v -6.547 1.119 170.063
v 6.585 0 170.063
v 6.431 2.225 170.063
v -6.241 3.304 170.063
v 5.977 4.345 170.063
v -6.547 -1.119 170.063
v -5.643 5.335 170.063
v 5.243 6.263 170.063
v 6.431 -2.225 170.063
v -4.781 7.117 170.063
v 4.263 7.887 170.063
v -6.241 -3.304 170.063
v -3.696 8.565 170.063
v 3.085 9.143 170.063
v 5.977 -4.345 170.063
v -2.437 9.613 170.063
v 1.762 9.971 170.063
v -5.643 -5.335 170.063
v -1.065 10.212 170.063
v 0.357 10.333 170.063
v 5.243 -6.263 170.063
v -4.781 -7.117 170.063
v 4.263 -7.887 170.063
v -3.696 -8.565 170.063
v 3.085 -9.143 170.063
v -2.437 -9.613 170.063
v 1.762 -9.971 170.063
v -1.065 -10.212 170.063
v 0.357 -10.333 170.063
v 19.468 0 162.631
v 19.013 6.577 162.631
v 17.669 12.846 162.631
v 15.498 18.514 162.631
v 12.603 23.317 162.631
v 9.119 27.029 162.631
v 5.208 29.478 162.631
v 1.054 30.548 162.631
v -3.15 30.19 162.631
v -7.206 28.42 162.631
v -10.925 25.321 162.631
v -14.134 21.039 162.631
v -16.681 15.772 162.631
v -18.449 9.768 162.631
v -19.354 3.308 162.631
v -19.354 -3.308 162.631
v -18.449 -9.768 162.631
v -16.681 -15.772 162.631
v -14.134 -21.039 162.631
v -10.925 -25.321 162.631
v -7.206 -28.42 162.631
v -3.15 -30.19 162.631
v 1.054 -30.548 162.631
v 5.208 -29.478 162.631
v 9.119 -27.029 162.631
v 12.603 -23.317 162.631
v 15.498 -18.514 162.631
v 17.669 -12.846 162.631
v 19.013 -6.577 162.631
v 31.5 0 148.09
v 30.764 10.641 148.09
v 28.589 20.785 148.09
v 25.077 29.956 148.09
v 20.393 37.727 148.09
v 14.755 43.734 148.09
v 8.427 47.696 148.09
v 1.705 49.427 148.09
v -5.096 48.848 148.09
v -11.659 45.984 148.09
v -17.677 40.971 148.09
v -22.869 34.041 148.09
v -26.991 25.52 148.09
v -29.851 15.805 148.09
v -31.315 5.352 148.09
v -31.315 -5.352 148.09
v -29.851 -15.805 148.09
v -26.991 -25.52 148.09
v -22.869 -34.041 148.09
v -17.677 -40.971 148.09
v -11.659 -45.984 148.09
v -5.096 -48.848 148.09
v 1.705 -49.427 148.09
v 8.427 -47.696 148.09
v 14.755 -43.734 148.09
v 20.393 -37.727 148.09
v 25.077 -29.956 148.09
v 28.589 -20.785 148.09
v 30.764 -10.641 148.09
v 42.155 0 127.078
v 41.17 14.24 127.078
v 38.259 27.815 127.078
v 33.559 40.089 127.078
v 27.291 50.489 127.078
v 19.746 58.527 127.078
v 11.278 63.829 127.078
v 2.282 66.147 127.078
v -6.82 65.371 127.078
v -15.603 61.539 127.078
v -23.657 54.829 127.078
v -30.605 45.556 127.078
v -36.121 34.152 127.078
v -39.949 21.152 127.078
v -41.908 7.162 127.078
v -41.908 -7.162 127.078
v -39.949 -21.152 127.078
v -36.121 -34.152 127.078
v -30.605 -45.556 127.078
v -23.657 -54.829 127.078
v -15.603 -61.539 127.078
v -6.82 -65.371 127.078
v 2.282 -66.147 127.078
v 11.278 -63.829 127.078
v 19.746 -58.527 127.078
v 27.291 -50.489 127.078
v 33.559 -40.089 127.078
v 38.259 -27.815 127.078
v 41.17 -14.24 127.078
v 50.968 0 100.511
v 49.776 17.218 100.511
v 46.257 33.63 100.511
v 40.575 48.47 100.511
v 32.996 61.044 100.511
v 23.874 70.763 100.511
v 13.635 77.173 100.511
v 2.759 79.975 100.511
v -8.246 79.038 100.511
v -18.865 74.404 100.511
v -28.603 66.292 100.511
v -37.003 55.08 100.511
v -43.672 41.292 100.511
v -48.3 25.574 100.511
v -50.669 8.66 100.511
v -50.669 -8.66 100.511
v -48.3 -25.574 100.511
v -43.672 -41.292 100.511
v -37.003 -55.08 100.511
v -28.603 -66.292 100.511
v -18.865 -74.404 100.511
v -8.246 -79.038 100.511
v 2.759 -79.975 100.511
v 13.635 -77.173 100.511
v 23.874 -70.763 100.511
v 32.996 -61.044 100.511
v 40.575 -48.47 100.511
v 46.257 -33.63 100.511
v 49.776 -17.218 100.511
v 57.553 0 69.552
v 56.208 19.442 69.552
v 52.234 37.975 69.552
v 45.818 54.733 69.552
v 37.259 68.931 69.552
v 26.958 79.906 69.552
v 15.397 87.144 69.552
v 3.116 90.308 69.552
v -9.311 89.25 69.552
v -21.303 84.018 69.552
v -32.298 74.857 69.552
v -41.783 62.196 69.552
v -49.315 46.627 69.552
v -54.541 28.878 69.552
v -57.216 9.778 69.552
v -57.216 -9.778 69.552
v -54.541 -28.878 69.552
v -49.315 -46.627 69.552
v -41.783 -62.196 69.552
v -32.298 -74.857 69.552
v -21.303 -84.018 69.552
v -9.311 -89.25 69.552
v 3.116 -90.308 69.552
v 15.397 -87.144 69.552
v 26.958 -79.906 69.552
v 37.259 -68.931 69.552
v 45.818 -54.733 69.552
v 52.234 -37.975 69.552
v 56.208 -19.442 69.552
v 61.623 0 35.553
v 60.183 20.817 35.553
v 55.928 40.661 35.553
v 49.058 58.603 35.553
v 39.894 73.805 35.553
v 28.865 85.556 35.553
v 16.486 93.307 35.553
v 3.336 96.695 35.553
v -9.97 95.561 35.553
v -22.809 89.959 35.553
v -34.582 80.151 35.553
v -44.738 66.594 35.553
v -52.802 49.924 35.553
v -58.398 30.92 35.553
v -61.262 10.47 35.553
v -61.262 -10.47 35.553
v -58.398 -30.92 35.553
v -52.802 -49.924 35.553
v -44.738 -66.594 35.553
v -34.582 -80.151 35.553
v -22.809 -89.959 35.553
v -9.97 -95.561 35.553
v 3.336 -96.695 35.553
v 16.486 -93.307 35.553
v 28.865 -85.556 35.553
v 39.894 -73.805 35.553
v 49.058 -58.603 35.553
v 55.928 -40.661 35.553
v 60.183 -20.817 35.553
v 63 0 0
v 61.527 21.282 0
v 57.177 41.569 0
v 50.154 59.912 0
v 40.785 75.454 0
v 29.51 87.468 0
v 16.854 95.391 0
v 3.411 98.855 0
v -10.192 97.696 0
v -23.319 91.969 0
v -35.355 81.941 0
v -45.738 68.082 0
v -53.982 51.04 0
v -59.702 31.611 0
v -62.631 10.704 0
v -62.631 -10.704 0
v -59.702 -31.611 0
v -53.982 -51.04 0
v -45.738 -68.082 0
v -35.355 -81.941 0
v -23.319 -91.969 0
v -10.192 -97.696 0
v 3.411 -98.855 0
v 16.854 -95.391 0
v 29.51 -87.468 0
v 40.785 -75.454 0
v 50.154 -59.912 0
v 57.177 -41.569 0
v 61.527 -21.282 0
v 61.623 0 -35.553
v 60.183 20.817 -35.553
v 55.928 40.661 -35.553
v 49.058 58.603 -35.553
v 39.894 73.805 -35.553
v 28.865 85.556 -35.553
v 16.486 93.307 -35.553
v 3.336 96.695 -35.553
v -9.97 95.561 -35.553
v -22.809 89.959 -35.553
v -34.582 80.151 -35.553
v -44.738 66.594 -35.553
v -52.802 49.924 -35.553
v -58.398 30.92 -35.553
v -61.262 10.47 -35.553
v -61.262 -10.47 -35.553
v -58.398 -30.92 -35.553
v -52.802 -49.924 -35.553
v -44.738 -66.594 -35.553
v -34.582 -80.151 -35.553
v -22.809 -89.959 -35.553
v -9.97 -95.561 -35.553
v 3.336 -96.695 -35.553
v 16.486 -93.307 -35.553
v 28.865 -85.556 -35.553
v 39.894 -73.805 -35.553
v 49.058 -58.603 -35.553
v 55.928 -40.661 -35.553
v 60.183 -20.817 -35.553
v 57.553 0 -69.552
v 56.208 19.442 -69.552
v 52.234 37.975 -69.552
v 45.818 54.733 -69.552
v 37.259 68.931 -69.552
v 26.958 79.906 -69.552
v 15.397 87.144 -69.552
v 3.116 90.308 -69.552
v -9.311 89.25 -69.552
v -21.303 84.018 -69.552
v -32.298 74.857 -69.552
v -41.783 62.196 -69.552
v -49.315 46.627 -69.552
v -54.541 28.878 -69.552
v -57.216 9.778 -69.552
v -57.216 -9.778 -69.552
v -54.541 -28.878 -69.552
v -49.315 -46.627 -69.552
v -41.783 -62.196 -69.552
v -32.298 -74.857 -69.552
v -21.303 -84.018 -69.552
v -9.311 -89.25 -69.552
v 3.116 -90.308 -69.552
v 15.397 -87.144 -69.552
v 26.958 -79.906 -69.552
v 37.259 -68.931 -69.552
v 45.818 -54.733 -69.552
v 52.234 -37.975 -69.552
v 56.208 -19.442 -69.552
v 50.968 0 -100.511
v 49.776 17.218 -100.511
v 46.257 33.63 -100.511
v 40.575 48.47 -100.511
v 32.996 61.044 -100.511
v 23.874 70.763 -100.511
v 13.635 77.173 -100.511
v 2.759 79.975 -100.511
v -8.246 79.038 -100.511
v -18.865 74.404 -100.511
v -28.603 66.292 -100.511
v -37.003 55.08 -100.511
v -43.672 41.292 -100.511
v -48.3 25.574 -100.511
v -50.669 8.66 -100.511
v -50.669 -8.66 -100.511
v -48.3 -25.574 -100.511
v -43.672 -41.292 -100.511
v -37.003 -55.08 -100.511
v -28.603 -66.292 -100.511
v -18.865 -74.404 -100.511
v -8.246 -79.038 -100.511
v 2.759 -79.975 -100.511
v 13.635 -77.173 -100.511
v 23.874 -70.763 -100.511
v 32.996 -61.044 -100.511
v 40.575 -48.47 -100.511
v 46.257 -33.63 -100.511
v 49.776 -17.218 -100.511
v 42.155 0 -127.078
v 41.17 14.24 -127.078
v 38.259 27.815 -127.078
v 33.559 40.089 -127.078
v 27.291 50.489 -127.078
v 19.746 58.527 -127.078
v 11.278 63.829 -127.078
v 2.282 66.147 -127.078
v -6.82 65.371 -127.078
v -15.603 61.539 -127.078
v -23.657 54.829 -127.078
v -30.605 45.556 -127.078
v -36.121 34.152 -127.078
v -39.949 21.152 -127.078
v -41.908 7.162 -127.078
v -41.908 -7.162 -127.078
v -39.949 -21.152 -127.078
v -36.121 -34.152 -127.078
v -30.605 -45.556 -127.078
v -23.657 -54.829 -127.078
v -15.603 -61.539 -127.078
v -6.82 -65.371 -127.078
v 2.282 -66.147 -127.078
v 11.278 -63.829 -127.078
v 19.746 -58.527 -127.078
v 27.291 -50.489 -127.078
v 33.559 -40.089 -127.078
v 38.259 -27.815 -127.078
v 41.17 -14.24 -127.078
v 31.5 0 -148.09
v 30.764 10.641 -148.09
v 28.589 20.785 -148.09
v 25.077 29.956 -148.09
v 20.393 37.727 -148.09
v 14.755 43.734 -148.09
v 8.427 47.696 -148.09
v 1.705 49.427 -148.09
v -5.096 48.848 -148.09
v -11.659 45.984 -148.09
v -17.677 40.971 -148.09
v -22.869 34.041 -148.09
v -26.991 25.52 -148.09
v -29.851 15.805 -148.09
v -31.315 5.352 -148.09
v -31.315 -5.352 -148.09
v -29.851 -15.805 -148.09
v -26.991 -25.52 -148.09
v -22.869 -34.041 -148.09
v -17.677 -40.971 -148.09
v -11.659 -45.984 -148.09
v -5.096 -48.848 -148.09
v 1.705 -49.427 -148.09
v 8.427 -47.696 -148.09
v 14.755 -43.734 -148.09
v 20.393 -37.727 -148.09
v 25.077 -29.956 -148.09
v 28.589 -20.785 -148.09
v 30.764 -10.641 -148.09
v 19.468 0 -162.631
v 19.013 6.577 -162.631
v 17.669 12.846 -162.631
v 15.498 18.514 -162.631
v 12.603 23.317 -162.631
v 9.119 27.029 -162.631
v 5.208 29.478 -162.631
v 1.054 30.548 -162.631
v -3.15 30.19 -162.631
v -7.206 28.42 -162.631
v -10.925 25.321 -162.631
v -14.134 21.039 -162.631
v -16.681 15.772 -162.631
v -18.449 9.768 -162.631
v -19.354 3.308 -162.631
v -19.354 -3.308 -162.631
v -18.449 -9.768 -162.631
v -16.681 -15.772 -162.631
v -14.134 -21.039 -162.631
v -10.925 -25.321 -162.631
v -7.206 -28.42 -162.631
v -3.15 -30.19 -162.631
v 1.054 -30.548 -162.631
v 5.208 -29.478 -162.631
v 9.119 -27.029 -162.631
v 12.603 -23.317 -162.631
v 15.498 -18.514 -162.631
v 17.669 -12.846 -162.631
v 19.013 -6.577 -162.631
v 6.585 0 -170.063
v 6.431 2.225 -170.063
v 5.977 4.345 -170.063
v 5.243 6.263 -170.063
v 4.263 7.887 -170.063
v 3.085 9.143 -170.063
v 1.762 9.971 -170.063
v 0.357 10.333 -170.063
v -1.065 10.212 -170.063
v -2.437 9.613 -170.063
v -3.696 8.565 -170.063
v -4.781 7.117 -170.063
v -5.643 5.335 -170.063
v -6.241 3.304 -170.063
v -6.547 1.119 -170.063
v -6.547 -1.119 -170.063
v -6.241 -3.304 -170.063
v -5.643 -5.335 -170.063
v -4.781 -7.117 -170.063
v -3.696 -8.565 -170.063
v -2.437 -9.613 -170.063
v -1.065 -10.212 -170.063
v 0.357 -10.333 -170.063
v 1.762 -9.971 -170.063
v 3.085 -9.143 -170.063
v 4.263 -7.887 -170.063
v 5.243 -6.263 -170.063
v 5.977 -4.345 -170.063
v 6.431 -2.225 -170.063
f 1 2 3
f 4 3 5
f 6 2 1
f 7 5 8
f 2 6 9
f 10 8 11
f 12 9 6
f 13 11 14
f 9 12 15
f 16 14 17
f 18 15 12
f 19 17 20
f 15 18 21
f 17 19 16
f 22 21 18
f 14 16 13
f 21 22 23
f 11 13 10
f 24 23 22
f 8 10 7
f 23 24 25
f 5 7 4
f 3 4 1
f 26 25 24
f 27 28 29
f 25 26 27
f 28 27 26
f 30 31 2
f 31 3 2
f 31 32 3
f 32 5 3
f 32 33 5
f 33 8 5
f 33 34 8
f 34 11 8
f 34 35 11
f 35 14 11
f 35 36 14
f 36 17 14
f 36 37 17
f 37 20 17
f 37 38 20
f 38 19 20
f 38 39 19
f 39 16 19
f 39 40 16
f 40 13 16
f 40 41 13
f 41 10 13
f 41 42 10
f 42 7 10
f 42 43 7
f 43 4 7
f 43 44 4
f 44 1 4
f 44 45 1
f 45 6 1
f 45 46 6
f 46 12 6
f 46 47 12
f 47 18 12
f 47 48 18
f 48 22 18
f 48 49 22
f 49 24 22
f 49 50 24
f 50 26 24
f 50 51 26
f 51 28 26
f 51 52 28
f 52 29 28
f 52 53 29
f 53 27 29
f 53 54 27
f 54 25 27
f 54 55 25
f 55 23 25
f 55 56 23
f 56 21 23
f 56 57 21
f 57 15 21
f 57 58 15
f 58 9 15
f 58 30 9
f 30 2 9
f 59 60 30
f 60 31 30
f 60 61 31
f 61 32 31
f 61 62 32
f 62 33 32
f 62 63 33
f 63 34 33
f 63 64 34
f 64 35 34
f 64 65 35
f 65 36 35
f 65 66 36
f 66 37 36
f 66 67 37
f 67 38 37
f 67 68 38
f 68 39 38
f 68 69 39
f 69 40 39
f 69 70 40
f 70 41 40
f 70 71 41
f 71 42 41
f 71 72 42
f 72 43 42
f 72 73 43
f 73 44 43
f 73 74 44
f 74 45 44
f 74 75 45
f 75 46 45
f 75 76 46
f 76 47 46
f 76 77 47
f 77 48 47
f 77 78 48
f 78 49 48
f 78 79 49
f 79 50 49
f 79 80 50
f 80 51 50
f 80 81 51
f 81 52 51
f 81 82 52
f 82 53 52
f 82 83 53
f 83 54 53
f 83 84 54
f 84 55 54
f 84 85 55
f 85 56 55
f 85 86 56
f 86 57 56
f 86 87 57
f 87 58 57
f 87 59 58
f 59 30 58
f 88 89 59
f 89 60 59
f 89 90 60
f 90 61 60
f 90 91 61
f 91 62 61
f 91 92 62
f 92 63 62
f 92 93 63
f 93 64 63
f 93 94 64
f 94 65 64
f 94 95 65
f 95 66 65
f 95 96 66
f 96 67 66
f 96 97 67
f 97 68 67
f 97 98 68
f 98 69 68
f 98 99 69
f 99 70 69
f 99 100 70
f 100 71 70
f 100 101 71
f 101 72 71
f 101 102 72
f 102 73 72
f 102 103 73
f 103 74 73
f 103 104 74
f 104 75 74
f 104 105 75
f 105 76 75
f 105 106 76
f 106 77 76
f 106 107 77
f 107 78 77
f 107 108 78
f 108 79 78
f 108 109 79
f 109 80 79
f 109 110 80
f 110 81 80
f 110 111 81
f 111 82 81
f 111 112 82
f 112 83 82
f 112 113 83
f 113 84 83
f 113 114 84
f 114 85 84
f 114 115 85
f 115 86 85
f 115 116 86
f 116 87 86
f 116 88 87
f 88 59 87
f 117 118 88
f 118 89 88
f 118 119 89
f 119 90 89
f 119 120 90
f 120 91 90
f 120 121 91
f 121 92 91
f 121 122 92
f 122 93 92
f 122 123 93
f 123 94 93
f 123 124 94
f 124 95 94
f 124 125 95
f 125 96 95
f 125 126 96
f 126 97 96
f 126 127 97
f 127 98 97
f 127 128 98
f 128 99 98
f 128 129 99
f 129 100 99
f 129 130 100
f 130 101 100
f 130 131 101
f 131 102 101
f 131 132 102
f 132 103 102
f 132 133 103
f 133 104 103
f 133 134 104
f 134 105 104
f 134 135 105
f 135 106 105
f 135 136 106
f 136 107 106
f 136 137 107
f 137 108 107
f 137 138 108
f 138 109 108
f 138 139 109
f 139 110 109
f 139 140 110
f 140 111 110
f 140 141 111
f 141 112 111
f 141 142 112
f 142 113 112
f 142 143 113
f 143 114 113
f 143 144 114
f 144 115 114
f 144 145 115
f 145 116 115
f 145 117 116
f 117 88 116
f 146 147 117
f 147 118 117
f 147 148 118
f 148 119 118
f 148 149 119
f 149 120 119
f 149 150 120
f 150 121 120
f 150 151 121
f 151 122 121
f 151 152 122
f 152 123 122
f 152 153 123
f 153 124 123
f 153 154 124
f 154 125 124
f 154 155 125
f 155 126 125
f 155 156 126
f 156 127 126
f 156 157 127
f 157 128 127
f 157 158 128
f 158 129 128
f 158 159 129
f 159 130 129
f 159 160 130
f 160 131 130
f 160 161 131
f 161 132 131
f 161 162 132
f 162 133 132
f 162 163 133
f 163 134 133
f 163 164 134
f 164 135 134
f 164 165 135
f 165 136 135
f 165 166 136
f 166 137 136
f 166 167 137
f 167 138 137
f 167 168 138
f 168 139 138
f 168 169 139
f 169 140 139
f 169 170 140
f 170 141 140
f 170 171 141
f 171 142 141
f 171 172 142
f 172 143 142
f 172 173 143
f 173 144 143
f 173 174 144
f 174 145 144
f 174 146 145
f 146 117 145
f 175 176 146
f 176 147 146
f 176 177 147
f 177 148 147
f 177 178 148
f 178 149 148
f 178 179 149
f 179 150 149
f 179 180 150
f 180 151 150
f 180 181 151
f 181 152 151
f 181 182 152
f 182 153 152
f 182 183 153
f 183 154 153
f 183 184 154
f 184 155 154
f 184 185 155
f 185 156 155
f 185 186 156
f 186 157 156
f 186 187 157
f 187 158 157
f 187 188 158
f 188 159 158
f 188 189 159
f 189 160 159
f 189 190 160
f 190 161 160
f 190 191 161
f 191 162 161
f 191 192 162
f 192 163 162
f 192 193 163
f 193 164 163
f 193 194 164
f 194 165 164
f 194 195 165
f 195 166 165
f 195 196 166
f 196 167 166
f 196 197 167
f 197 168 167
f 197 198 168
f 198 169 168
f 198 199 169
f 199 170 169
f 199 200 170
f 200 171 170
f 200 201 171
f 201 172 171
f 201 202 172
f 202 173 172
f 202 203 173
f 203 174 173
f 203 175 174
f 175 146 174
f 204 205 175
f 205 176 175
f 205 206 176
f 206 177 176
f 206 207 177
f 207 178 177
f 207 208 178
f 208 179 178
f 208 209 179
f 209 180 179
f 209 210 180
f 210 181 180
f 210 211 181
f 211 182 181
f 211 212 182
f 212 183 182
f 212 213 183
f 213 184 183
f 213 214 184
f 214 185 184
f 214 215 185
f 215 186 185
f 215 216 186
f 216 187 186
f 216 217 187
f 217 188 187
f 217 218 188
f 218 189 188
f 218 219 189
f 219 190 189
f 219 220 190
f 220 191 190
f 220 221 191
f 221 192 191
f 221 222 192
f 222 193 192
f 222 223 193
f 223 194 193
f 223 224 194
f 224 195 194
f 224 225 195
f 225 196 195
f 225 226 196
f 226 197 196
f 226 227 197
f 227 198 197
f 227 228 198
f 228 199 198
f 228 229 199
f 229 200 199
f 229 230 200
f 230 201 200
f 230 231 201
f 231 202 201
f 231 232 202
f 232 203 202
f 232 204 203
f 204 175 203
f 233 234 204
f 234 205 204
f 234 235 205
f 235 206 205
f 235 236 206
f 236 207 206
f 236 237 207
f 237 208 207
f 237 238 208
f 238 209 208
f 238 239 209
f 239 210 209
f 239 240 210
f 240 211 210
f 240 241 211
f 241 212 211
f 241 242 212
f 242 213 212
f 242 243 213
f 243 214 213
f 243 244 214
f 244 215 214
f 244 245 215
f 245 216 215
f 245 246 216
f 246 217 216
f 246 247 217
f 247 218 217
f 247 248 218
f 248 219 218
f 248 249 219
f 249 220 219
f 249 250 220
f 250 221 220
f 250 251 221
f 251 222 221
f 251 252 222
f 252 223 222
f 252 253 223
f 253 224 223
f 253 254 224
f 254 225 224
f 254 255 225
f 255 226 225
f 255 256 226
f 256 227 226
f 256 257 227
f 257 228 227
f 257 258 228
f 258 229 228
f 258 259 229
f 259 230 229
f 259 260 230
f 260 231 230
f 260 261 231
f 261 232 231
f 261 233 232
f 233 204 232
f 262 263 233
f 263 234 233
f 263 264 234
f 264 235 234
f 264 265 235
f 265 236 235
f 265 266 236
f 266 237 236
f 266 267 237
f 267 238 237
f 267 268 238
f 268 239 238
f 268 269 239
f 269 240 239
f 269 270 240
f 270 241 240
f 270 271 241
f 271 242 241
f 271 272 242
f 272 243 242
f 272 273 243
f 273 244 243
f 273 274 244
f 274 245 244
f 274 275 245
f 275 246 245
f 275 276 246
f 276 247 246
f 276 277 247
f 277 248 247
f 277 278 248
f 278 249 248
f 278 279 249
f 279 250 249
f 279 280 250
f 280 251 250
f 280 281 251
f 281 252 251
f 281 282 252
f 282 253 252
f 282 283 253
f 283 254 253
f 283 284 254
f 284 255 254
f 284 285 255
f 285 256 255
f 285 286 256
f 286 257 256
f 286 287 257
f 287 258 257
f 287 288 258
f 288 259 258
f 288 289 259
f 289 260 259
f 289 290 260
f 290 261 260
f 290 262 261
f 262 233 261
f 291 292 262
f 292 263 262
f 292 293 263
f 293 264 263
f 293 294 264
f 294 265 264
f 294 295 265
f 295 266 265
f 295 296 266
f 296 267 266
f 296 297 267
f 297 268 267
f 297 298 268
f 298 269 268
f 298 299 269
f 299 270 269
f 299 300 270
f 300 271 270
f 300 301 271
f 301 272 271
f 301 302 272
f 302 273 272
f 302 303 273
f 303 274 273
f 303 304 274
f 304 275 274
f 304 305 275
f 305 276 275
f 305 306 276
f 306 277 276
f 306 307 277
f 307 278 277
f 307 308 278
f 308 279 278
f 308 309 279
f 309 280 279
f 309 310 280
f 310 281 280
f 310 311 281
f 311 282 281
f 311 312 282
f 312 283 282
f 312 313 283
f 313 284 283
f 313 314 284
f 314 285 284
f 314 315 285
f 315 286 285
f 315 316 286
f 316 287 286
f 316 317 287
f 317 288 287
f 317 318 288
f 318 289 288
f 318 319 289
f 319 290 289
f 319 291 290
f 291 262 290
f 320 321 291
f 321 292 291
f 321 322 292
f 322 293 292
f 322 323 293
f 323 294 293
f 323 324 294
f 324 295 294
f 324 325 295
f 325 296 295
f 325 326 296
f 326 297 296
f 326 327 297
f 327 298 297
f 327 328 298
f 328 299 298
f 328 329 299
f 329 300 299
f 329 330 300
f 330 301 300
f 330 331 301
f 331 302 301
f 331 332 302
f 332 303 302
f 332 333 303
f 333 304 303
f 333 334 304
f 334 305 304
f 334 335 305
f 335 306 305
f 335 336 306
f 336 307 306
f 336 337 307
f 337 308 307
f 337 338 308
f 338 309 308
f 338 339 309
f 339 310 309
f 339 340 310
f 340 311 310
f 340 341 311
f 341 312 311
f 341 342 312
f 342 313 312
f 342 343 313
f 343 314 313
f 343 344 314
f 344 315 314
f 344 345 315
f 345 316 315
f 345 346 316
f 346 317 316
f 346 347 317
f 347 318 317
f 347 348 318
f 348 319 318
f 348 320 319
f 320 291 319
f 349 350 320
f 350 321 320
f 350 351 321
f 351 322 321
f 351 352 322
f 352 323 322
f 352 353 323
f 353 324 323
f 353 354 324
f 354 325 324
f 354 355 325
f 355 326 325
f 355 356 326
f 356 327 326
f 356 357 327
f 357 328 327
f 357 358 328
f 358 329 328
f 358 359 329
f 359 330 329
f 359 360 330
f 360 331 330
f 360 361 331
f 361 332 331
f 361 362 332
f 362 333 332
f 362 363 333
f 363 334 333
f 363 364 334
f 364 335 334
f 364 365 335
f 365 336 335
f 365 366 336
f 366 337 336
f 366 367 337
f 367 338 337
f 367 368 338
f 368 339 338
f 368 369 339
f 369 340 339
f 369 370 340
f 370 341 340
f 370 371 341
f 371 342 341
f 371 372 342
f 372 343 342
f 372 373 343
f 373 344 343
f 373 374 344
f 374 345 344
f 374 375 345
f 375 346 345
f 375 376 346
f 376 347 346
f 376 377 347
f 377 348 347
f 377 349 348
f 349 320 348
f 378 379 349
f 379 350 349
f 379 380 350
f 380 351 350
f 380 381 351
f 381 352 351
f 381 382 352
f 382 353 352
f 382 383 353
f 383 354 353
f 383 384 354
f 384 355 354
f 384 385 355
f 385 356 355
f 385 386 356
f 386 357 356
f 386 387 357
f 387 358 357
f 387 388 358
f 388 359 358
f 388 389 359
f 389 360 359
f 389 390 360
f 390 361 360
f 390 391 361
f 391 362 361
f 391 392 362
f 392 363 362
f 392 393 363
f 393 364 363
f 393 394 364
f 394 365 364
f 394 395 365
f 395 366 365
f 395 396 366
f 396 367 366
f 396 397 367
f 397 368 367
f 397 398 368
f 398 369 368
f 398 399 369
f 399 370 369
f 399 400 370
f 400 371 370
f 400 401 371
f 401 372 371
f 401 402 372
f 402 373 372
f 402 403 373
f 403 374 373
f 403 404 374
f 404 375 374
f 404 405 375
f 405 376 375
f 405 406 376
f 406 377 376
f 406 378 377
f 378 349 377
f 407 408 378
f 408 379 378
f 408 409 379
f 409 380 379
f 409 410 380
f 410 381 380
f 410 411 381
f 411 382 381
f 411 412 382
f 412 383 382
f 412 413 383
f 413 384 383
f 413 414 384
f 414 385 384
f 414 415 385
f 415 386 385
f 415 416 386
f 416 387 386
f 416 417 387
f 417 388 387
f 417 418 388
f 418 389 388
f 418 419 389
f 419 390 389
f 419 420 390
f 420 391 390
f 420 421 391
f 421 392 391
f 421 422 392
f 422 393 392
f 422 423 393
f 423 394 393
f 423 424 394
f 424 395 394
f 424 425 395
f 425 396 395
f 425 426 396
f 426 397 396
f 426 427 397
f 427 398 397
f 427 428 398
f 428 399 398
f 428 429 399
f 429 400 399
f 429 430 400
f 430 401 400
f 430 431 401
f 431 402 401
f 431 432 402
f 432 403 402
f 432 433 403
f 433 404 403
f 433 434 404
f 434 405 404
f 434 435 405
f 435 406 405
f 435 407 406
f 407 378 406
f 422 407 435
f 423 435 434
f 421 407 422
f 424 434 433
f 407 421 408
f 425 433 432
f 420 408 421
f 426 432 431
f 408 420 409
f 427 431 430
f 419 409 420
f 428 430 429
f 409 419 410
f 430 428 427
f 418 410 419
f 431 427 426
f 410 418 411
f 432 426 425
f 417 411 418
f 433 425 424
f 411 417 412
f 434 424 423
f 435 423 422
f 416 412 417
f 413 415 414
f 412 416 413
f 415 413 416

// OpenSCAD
// Generated by SolidPython 1.0.1 on 2020-07-29 00:46:47


scale(v = [7, 11, 19]) {
	sphere(r = 9);
}
/***********************************************
*********      SolidPython code:      **********
************************************************
 
# import packages: SolidPython
from solid import *
from solid.utils import *
from itertools import chain, combinations, permutations


class Resize:

    def __init__(self, scad_file):
        self.scad_file = scad_file
        #self.scad_file = import_scad(scad_file)
        # cone/cylinder param:
        self.r1 = 0
        self.r2 = 0
        self.h = 0
        # rectangular prism param:
        self.w = 0
        self.l = 0
        # ellipse param:
        self.r = 0

    # import OpenScad code (file name corresponds to shape)


    # classify shape + parameters
    def assign(self, param1, param2, param3):
        if self.scad_file == 'cone.scad':
            self.r1 = param1
            self.r2 = param2
            self.h = param3
        elif self.scad_file == 'cylinder.scad':
            self.r1 = param1
            self.r2 = param2
            self.h = param3
        elif self.scad_file == 'rectangularPrism.scad':
            self.h = param1
            self.l = param2
            self.w = param3
        else:
            self.r = param1
            self.h = param2

    # resize parameters
    def iterate(self):
        x = range(3, 20, 2)
        i = 1
        if self.scad_file == 'cone.scad':
            tempList = list(permutations(x, 2))
            for temp in tempList:
                param1 = temp[0]
                param2 = temp[1]
                filepath = 'produced_scad_files/' + 'cone' + str(param1) + '_' + str(param2) + '_' + '.scad'
                scad_render_to_file(cylinder(h=param1, r1=param2, r2=0), filepath)

        elif self.scad_file == 'cylinder.scad':
            tempList = list(permutations(x, 3))
            for temp in tempList:
                param1 = temp[0]
                param2 = temp[1]
                filepath = 'produced_scad_files/' + 'cylinder' + str(param1) + '_' + str(param2) + '_' + '.scad'
                scad_render_to_file(cylinder(h=param1, r1=param2, r2=param2), filepath)

        elif self.scad_file == 'rectangularPrism.scad':
            tempList = list(permutations(x, 3))
            for temp in tempList:
                param1 = temp[0]
                param2 = temp[1]
                param3 = temp[2]
                filepath = 'produced_scad_files/' + 'rectangularPrism' + str(param1) + '_' + str(param2) + '_' + str(
                    param3) + '.scad'
                scad_render_to_file(cube(size=(param1, param2, param3)), filepath)

        elif self.scad_file == 'ellipse.scad':
            tempList = list(permutations(x, 4))
            for temp in tempList:
                param1 = temp[0]
                param2 = temp[1]
                param3 = temp[2]
                param4 = temp[3]
                filepath = 'produced_scad_files/' + 'ellipse' + str(param1) + '_' + str(param2) + '_' + str(param3) + '_' + str(param4) + '.scad'
                scad_render_to_file(scale([param1, param2, param3])(sphere(r=param4)), filepath)

    def render_to_scadfile(self):
        scad_render_to_file(scad, 'example.scad') 
 
************************************************/
